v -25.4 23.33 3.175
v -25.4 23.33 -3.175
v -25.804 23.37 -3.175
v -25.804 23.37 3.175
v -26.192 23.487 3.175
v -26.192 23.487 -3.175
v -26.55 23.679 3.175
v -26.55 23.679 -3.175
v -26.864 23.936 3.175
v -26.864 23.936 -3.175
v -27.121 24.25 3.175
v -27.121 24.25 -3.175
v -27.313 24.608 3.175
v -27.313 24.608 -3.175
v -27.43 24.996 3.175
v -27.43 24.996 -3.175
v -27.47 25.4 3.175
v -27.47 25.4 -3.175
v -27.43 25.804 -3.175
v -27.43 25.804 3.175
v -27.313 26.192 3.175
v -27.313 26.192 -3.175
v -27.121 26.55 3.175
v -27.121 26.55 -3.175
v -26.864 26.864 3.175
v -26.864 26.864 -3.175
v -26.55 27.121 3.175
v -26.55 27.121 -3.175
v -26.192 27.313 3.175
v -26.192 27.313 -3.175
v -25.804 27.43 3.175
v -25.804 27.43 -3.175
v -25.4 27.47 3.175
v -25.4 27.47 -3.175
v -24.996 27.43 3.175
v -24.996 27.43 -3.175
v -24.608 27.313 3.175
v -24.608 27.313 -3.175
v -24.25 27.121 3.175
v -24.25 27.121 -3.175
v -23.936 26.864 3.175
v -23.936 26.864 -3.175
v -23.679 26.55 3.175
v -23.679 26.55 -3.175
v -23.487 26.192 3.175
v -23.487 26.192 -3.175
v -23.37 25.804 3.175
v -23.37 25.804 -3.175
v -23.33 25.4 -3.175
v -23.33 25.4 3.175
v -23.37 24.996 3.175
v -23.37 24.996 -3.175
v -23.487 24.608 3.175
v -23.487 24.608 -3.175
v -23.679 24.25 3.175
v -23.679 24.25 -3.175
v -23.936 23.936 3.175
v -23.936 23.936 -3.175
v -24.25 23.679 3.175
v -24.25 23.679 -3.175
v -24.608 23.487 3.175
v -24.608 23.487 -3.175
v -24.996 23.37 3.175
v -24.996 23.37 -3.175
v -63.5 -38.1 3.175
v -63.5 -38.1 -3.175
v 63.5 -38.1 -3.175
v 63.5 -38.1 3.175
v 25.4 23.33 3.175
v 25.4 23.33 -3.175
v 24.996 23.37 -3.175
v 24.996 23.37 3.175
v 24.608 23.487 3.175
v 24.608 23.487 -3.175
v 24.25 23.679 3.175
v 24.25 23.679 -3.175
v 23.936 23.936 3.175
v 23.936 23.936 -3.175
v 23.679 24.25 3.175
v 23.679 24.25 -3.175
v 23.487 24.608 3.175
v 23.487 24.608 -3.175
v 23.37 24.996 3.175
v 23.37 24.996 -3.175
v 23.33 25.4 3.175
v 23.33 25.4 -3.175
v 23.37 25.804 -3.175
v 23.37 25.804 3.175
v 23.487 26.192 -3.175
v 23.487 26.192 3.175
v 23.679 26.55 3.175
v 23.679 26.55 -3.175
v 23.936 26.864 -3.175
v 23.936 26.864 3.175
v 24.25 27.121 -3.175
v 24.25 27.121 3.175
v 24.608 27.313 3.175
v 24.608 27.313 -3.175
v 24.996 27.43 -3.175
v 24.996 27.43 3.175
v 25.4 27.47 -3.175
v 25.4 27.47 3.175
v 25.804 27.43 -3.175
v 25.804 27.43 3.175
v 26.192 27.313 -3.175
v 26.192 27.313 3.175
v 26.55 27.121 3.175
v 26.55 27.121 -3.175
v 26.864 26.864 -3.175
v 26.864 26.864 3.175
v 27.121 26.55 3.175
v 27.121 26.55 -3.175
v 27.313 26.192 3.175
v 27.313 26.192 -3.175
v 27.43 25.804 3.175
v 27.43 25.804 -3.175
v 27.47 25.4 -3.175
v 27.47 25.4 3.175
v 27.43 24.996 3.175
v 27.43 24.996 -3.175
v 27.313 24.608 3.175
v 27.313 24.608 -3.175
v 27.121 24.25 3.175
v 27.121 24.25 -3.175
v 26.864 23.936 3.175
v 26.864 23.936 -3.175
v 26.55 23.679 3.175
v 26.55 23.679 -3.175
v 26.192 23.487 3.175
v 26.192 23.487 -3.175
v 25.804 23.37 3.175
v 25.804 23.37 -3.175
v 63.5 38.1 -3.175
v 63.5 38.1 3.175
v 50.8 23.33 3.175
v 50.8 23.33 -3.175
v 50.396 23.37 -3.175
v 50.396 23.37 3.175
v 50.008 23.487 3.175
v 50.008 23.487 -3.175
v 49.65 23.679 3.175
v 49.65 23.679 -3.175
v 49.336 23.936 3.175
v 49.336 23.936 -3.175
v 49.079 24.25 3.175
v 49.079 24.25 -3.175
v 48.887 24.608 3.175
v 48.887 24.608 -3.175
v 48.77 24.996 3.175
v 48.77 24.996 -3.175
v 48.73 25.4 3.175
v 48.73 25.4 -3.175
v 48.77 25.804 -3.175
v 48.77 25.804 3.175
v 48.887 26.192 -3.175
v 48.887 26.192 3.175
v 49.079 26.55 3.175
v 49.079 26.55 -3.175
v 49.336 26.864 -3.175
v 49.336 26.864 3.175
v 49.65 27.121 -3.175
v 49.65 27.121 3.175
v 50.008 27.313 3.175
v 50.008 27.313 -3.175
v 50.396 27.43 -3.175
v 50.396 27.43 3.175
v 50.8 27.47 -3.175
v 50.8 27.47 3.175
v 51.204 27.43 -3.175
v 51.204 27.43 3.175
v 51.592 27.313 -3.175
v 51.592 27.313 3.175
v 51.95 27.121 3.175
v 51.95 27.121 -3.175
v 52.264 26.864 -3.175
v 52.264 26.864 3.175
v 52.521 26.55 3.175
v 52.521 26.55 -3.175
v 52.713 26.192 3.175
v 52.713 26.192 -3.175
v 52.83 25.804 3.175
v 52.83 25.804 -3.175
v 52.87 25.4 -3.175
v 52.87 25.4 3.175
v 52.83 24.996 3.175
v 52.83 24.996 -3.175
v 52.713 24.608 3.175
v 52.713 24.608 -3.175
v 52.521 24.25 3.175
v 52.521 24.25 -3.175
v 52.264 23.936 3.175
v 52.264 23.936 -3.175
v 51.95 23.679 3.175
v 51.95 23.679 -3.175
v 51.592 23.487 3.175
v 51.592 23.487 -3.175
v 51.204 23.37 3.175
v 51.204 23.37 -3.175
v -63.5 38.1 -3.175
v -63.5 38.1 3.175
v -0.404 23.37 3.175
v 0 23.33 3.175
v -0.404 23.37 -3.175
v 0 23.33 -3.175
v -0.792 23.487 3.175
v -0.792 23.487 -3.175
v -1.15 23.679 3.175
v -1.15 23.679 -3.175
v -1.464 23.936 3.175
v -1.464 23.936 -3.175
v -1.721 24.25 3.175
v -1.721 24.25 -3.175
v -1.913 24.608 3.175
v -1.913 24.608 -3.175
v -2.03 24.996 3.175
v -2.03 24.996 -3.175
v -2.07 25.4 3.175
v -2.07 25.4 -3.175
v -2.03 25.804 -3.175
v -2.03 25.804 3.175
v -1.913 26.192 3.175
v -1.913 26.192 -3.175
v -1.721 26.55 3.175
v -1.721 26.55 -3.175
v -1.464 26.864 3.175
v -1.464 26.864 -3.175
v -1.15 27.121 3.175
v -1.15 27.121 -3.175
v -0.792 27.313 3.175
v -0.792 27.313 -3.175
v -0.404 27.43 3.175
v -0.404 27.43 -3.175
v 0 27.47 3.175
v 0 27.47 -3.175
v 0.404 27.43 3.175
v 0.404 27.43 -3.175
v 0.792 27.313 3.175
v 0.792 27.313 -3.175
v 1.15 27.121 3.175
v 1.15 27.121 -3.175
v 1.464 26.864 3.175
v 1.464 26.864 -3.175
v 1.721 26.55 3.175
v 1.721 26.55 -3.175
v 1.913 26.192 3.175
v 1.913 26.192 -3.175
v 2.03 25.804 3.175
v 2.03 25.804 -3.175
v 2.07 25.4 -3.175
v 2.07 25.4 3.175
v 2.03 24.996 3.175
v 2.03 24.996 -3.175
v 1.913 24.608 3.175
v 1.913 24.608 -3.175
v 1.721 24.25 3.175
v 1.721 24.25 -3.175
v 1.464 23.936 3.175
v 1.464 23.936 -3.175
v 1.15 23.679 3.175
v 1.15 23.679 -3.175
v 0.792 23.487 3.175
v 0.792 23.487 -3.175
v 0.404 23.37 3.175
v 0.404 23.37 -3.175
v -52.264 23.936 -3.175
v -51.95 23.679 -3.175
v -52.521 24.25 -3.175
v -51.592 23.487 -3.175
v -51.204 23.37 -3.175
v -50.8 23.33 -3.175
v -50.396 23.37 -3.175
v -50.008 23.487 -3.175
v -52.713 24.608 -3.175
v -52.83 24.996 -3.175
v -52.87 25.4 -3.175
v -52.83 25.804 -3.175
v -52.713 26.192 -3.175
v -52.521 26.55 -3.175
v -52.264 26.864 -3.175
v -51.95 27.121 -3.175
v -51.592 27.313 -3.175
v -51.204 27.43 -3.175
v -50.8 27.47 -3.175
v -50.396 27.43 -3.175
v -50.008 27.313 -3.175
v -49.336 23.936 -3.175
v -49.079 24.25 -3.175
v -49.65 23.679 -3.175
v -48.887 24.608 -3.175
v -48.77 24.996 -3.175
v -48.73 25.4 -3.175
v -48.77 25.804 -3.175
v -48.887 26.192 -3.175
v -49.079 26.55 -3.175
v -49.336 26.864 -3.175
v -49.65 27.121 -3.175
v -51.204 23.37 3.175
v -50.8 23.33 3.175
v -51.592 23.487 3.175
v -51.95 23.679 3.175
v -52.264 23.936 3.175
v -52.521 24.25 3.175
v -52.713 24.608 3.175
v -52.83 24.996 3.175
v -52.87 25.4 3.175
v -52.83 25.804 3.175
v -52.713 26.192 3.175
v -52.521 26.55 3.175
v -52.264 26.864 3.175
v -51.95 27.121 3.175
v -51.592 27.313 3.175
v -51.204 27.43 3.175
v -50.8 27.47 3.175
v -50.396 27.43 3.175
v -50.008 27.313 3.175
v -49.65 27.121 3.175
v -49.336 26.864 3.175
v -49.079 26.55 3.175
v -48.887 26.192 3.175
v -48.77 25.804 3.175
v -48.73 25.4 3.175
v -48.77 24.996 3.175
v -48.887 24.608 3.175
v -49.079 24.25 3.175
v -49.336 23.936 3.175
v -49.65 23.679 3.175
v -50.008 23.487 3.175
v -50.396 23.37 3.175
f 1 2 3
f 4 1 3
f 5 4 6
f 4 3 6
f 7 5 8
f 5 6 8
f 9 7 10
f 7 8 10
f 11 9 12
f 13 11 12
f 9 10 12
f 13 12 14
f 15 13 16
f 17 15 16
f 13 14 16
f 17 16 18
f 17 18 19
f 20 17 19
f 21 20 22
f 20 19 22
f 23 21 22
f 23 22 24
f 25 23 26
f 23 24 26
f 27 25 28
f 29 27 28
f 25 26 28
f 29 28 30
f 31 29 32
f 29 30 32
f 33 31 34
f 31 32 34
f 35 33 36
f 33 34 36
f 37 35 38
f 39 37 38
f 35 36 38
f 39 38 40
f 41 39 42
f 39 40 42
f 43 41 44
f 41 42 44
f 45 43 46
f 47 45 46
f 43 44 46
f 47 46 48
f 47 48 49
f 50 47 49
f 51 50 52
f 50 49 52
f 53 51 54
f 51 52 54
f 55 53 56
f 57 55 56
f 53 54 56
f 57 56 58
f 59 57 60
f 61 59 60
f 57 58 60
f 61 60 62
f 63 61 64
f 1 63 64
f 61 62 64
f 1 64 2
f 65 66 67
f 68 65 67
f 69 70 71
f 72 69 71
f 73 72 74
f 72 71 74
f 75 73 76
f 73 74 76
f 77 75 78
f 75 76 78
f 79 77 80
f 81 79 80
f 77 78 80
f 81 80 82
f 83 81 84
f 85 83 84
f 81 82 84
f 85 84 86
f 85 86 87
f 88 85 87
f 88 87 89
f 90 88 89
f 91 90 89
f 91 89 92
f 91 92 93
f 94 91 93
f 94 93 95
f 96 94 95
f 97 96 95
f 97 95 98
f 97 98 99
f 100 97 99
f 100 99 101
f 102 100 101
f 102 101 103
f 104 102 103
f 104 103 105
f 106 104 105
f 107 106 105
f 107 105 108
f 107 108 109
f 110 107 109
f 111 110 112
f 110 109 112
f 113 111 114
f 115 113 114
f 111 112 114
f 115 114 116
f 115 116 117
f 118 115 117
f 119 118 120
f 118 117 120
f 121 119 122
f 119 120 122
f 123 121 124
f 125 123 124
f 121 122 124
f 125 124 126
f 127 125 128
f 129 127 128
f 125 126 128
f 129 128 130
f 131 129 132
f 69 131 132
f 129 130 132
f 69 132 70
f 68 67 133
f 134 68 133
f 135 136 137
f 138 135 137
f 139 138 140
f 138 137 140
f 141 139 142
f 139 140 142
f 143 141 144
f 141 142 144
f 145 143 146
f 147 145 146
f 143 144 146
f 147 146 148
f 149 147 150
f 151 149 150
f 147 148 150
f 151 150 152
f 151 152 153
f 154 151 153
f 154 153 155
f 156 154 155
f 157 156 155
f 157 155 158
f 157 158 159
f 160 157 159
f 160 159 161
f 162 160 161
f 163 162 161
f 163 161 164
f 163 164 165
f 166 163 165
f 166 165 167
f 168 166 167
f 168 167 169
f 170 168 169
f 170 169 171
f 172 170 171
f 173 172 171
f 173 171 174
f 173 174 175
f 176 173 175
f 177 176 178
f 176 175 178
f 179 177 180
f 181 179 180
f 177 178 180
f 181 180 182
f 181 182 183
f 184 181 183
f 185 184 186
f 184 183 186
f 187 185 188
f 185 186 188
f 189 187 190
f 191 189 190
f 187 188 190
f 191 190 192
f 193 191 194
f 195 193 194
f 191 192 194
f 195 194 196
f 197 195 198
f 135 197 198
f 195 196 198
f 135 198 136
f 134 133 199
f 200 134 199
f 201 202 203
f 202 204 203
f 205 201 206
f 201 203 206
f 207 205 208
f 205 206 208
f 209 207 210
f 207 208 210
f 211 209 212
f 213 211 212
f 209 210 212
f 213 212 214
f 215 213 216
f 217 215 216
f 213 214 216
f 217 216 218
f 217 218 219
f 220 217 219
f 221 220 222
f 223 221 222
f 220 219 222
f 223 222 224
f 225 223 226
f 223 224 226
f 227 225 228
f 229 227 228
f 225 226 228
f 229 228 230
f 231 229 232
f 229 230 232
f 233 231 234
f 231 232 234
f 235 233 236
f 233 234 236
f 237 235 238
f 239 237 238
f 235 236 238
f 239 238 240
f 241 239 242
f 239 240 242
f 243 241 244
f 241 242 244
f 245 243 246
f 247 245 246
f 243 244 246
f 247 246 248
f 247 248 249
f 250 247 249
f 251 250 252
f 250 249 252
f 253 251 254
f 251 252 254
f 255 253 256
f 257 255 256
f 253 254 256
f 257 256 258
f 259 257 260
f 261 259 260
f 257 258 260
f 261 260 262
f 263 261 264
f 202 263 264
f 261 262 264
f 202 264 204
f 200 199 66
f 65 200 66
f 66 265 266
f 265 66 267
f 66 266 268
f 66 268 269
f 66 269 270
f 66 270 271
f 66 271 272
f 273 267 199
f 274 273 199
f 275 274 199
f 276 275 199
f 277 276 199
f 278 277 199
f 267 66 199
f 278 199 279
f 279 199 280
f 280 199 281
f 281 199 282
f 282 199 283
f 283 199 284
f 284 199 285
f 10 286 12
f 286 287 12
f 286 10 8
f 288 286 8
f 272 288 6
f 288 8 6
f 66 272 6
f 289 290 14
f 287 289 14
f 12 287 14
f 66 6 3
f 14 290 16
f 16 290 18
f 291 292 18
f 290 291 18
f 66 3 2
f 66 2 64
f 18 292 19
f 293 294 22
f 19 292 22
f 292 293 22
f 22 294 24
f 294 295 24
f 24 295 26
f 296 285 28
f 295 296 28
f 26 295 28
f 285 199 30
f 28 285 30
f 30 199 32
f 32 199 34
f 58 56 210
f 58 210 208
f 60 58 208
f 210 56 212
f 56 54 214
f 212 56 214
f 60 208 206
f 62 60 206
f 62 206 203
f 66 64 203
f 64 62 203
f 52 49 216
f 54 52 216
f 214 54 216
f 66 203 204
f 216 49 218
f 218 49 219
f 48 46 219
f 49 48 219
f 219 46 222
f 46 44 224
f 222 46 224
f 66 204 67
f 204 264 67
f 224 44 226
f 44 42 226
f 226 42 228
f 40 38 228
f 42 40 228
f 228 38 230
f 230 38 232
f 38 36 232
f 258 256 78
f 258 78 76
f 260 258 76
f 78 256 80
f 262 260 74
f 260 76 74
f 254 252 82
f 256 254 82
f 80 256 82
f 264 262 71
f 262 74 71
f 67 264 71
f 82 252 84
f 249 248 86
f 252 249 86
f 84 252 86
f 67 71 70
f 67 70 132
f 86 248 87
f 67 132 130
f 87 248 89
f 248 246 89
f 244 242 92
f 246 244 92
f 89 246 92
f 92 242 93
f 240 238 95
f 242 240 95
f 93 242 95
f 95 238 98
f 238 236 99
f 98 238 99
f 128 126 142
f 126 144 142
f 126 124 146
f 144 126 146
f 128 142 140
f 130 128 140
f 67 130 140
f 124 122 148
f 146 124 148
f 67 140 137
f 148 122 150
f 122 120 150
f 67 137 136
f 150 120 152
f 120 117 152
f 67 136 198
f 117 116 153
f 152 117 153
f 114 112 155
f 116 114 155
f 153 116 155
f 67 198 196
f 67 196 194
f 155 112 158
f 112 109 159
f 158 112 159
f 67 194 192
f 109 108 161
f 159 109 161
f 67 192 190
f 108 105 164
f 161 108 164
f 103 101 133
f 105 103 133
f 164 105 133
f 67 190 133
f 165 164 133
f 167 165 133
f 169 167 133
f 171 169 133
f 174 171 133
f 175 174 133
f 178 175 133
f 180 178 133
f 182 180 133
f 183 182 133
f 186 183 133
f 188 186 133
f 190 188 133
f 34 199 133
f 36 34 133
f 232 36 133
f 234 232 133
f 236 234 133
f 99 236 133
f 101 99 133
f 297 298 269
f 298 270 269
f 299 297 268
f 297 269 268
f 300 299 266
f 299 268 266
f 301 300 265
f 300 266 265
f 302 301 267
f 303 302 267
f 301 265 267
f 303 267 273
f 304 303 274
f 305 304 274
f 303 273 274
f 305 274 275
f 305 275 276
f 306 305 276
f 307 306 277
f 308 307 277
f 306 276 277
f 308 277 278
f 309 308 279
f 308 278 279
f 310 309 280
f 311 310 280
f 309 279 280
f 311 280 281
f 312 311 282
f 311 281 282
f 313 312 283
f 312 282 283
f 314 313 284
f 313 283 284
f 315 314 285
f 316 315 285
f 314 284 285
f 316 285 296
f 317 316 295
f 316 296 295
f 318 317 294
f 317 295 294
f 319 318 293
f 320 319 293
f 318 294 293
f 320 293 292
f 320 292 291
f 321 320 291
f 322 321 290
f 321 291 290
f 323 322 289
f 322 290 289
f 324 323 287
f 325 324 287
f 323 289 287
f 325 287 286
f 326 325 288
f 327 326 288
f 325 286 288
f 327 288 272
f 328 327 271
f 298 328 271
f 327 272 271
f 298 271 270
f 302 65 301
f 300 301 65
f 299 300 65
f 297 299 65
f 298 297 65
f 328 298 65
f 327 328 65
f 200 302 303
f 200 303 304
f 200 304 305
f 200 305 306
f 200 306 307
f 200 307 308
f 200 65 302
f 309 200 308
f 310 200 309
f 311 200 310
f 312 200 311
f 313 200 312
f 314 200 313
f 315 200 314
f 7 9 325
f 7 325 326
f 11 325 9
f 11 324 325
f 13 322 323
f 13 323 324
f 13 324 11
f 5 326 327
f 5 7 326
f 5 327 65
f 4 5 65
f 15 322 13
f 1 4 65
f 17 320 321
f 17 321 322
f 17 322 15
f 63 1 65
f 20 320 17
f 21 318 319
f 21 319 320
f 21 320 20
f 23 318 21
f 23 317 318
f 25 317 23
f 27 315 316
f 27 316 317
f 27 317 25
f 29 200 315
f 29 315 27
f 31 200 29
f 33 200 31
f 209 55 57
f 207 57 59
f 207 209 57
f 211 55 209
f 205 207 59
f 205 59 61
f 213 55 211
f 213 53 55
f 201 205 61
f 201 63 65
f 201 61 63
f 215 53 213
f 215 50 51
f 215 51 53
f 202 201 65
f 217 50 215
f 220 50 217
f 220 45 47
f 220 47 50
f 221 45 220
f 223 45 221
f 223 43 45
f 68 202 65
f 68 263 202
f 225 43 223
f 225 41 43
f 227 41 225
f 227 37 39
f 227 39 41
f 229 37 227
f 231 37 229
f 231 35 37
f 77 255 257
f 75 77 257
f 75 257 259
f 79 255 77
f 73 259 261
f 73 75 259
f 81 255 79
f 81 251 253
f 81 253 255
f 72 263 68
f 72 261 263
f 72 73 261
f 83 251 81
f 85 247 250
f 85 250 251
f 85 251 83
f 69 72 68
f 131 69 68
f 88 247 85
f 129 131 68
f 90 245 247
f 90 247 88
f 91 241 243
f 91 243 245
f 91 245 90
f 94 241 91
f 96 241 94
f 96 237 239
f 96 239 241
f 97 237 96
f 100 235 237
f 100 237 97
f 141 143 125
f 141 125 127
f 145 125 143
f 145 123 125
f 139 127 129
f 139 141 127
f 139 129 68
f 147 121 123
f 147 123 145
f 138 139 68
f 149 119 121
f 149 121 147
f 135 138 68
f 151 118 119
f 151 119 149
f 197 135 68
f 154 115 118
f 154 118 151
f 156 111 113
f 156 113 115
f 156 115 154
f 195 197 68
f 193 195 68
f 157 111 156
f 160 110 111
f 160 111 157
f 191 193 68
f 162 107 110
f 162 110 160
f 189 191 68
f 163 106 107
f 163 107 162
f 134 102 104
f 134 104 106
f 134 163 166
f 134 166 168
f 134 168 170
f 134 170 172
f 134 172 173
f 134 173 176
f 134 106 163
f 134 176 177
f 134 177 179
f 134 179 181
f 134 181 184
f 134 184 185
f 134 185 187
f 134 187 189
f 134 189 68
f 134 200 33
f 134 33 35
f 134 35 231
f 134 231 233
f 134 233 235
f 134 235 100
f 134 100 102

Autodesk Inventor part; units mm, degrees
ref_plane "YZ Plane" through (0, 0, 0) normal (1, 0, 0) x (0, 1, 0)
ref_plane "XZ Plane" through (0, 0, 0) normal (0, 1, 0) x (-1, 0, 0)
ref_plane "XY Plane" through (0, 0, 0) normal (0, 0, 1) x (1, 0, 0)
sketch "Sketch1" plane through (0, 0, 0) normal (0, 0, 1) x (1, 0, 0)
  line L0 (-63.5, -38.1) -> (63.5, -38.1)
  line L1 (63.5, -38.1) -> (63.5, 38.1)
  line L2 (63.5, 38.1) -> (-63.5, 38.1)
  line L3 (-63.5, 38.1) -> (-63.5, -38.1)
  line L4 (-63.5, -38.1) -> (63.5, 38.1) construction
  line L5 (63.5, -38.1) -> (-63.5, 38.1) construction
  point P0 (0, 0)
  dimension "d0" = 127
  dimension "d1" = 76.2
extrude "Extrusion1" add sketch "Sketch1" along normal mid plane 6.35
sketch "Sketch2" plane through (0, 0, 3.175) normal (0, 0, 1) x (1, 0, 0)
  line L0 (-63.5, 38.1) -> (-63.5, -38.1) projected
  line L1 (63.5, 38.1) -> (-63.5, 38.1) projected
  point P0 (0, 0)
  point P1 (-50.8, 25.4)
  point P2 (-25.4, 25.4)
  point P3 (0, 25.4)
  point P4 (25.4, 25.4)
  point P5 (50.8, 25.4)
  dimension "d4" = 25.4
  dimension "d5" = 25.4
  dimension "d6" = 25.4
  dimension "d8" = 12.7
  dimension "d9" = 12.7
  dimension "d17" = 25.4
hole "Hole2" at (-50.8, 25.4, 3.175) at (-25.4, 25.4, 3.175) at (0, 25.4, 3.175) at (25.4, 25.4, 3.175) at (50.8, 25.4, 3.175) direction (0, 0, -1) diameter 4.1402 end through all
properties part number "Extender_pulley_gusset"
